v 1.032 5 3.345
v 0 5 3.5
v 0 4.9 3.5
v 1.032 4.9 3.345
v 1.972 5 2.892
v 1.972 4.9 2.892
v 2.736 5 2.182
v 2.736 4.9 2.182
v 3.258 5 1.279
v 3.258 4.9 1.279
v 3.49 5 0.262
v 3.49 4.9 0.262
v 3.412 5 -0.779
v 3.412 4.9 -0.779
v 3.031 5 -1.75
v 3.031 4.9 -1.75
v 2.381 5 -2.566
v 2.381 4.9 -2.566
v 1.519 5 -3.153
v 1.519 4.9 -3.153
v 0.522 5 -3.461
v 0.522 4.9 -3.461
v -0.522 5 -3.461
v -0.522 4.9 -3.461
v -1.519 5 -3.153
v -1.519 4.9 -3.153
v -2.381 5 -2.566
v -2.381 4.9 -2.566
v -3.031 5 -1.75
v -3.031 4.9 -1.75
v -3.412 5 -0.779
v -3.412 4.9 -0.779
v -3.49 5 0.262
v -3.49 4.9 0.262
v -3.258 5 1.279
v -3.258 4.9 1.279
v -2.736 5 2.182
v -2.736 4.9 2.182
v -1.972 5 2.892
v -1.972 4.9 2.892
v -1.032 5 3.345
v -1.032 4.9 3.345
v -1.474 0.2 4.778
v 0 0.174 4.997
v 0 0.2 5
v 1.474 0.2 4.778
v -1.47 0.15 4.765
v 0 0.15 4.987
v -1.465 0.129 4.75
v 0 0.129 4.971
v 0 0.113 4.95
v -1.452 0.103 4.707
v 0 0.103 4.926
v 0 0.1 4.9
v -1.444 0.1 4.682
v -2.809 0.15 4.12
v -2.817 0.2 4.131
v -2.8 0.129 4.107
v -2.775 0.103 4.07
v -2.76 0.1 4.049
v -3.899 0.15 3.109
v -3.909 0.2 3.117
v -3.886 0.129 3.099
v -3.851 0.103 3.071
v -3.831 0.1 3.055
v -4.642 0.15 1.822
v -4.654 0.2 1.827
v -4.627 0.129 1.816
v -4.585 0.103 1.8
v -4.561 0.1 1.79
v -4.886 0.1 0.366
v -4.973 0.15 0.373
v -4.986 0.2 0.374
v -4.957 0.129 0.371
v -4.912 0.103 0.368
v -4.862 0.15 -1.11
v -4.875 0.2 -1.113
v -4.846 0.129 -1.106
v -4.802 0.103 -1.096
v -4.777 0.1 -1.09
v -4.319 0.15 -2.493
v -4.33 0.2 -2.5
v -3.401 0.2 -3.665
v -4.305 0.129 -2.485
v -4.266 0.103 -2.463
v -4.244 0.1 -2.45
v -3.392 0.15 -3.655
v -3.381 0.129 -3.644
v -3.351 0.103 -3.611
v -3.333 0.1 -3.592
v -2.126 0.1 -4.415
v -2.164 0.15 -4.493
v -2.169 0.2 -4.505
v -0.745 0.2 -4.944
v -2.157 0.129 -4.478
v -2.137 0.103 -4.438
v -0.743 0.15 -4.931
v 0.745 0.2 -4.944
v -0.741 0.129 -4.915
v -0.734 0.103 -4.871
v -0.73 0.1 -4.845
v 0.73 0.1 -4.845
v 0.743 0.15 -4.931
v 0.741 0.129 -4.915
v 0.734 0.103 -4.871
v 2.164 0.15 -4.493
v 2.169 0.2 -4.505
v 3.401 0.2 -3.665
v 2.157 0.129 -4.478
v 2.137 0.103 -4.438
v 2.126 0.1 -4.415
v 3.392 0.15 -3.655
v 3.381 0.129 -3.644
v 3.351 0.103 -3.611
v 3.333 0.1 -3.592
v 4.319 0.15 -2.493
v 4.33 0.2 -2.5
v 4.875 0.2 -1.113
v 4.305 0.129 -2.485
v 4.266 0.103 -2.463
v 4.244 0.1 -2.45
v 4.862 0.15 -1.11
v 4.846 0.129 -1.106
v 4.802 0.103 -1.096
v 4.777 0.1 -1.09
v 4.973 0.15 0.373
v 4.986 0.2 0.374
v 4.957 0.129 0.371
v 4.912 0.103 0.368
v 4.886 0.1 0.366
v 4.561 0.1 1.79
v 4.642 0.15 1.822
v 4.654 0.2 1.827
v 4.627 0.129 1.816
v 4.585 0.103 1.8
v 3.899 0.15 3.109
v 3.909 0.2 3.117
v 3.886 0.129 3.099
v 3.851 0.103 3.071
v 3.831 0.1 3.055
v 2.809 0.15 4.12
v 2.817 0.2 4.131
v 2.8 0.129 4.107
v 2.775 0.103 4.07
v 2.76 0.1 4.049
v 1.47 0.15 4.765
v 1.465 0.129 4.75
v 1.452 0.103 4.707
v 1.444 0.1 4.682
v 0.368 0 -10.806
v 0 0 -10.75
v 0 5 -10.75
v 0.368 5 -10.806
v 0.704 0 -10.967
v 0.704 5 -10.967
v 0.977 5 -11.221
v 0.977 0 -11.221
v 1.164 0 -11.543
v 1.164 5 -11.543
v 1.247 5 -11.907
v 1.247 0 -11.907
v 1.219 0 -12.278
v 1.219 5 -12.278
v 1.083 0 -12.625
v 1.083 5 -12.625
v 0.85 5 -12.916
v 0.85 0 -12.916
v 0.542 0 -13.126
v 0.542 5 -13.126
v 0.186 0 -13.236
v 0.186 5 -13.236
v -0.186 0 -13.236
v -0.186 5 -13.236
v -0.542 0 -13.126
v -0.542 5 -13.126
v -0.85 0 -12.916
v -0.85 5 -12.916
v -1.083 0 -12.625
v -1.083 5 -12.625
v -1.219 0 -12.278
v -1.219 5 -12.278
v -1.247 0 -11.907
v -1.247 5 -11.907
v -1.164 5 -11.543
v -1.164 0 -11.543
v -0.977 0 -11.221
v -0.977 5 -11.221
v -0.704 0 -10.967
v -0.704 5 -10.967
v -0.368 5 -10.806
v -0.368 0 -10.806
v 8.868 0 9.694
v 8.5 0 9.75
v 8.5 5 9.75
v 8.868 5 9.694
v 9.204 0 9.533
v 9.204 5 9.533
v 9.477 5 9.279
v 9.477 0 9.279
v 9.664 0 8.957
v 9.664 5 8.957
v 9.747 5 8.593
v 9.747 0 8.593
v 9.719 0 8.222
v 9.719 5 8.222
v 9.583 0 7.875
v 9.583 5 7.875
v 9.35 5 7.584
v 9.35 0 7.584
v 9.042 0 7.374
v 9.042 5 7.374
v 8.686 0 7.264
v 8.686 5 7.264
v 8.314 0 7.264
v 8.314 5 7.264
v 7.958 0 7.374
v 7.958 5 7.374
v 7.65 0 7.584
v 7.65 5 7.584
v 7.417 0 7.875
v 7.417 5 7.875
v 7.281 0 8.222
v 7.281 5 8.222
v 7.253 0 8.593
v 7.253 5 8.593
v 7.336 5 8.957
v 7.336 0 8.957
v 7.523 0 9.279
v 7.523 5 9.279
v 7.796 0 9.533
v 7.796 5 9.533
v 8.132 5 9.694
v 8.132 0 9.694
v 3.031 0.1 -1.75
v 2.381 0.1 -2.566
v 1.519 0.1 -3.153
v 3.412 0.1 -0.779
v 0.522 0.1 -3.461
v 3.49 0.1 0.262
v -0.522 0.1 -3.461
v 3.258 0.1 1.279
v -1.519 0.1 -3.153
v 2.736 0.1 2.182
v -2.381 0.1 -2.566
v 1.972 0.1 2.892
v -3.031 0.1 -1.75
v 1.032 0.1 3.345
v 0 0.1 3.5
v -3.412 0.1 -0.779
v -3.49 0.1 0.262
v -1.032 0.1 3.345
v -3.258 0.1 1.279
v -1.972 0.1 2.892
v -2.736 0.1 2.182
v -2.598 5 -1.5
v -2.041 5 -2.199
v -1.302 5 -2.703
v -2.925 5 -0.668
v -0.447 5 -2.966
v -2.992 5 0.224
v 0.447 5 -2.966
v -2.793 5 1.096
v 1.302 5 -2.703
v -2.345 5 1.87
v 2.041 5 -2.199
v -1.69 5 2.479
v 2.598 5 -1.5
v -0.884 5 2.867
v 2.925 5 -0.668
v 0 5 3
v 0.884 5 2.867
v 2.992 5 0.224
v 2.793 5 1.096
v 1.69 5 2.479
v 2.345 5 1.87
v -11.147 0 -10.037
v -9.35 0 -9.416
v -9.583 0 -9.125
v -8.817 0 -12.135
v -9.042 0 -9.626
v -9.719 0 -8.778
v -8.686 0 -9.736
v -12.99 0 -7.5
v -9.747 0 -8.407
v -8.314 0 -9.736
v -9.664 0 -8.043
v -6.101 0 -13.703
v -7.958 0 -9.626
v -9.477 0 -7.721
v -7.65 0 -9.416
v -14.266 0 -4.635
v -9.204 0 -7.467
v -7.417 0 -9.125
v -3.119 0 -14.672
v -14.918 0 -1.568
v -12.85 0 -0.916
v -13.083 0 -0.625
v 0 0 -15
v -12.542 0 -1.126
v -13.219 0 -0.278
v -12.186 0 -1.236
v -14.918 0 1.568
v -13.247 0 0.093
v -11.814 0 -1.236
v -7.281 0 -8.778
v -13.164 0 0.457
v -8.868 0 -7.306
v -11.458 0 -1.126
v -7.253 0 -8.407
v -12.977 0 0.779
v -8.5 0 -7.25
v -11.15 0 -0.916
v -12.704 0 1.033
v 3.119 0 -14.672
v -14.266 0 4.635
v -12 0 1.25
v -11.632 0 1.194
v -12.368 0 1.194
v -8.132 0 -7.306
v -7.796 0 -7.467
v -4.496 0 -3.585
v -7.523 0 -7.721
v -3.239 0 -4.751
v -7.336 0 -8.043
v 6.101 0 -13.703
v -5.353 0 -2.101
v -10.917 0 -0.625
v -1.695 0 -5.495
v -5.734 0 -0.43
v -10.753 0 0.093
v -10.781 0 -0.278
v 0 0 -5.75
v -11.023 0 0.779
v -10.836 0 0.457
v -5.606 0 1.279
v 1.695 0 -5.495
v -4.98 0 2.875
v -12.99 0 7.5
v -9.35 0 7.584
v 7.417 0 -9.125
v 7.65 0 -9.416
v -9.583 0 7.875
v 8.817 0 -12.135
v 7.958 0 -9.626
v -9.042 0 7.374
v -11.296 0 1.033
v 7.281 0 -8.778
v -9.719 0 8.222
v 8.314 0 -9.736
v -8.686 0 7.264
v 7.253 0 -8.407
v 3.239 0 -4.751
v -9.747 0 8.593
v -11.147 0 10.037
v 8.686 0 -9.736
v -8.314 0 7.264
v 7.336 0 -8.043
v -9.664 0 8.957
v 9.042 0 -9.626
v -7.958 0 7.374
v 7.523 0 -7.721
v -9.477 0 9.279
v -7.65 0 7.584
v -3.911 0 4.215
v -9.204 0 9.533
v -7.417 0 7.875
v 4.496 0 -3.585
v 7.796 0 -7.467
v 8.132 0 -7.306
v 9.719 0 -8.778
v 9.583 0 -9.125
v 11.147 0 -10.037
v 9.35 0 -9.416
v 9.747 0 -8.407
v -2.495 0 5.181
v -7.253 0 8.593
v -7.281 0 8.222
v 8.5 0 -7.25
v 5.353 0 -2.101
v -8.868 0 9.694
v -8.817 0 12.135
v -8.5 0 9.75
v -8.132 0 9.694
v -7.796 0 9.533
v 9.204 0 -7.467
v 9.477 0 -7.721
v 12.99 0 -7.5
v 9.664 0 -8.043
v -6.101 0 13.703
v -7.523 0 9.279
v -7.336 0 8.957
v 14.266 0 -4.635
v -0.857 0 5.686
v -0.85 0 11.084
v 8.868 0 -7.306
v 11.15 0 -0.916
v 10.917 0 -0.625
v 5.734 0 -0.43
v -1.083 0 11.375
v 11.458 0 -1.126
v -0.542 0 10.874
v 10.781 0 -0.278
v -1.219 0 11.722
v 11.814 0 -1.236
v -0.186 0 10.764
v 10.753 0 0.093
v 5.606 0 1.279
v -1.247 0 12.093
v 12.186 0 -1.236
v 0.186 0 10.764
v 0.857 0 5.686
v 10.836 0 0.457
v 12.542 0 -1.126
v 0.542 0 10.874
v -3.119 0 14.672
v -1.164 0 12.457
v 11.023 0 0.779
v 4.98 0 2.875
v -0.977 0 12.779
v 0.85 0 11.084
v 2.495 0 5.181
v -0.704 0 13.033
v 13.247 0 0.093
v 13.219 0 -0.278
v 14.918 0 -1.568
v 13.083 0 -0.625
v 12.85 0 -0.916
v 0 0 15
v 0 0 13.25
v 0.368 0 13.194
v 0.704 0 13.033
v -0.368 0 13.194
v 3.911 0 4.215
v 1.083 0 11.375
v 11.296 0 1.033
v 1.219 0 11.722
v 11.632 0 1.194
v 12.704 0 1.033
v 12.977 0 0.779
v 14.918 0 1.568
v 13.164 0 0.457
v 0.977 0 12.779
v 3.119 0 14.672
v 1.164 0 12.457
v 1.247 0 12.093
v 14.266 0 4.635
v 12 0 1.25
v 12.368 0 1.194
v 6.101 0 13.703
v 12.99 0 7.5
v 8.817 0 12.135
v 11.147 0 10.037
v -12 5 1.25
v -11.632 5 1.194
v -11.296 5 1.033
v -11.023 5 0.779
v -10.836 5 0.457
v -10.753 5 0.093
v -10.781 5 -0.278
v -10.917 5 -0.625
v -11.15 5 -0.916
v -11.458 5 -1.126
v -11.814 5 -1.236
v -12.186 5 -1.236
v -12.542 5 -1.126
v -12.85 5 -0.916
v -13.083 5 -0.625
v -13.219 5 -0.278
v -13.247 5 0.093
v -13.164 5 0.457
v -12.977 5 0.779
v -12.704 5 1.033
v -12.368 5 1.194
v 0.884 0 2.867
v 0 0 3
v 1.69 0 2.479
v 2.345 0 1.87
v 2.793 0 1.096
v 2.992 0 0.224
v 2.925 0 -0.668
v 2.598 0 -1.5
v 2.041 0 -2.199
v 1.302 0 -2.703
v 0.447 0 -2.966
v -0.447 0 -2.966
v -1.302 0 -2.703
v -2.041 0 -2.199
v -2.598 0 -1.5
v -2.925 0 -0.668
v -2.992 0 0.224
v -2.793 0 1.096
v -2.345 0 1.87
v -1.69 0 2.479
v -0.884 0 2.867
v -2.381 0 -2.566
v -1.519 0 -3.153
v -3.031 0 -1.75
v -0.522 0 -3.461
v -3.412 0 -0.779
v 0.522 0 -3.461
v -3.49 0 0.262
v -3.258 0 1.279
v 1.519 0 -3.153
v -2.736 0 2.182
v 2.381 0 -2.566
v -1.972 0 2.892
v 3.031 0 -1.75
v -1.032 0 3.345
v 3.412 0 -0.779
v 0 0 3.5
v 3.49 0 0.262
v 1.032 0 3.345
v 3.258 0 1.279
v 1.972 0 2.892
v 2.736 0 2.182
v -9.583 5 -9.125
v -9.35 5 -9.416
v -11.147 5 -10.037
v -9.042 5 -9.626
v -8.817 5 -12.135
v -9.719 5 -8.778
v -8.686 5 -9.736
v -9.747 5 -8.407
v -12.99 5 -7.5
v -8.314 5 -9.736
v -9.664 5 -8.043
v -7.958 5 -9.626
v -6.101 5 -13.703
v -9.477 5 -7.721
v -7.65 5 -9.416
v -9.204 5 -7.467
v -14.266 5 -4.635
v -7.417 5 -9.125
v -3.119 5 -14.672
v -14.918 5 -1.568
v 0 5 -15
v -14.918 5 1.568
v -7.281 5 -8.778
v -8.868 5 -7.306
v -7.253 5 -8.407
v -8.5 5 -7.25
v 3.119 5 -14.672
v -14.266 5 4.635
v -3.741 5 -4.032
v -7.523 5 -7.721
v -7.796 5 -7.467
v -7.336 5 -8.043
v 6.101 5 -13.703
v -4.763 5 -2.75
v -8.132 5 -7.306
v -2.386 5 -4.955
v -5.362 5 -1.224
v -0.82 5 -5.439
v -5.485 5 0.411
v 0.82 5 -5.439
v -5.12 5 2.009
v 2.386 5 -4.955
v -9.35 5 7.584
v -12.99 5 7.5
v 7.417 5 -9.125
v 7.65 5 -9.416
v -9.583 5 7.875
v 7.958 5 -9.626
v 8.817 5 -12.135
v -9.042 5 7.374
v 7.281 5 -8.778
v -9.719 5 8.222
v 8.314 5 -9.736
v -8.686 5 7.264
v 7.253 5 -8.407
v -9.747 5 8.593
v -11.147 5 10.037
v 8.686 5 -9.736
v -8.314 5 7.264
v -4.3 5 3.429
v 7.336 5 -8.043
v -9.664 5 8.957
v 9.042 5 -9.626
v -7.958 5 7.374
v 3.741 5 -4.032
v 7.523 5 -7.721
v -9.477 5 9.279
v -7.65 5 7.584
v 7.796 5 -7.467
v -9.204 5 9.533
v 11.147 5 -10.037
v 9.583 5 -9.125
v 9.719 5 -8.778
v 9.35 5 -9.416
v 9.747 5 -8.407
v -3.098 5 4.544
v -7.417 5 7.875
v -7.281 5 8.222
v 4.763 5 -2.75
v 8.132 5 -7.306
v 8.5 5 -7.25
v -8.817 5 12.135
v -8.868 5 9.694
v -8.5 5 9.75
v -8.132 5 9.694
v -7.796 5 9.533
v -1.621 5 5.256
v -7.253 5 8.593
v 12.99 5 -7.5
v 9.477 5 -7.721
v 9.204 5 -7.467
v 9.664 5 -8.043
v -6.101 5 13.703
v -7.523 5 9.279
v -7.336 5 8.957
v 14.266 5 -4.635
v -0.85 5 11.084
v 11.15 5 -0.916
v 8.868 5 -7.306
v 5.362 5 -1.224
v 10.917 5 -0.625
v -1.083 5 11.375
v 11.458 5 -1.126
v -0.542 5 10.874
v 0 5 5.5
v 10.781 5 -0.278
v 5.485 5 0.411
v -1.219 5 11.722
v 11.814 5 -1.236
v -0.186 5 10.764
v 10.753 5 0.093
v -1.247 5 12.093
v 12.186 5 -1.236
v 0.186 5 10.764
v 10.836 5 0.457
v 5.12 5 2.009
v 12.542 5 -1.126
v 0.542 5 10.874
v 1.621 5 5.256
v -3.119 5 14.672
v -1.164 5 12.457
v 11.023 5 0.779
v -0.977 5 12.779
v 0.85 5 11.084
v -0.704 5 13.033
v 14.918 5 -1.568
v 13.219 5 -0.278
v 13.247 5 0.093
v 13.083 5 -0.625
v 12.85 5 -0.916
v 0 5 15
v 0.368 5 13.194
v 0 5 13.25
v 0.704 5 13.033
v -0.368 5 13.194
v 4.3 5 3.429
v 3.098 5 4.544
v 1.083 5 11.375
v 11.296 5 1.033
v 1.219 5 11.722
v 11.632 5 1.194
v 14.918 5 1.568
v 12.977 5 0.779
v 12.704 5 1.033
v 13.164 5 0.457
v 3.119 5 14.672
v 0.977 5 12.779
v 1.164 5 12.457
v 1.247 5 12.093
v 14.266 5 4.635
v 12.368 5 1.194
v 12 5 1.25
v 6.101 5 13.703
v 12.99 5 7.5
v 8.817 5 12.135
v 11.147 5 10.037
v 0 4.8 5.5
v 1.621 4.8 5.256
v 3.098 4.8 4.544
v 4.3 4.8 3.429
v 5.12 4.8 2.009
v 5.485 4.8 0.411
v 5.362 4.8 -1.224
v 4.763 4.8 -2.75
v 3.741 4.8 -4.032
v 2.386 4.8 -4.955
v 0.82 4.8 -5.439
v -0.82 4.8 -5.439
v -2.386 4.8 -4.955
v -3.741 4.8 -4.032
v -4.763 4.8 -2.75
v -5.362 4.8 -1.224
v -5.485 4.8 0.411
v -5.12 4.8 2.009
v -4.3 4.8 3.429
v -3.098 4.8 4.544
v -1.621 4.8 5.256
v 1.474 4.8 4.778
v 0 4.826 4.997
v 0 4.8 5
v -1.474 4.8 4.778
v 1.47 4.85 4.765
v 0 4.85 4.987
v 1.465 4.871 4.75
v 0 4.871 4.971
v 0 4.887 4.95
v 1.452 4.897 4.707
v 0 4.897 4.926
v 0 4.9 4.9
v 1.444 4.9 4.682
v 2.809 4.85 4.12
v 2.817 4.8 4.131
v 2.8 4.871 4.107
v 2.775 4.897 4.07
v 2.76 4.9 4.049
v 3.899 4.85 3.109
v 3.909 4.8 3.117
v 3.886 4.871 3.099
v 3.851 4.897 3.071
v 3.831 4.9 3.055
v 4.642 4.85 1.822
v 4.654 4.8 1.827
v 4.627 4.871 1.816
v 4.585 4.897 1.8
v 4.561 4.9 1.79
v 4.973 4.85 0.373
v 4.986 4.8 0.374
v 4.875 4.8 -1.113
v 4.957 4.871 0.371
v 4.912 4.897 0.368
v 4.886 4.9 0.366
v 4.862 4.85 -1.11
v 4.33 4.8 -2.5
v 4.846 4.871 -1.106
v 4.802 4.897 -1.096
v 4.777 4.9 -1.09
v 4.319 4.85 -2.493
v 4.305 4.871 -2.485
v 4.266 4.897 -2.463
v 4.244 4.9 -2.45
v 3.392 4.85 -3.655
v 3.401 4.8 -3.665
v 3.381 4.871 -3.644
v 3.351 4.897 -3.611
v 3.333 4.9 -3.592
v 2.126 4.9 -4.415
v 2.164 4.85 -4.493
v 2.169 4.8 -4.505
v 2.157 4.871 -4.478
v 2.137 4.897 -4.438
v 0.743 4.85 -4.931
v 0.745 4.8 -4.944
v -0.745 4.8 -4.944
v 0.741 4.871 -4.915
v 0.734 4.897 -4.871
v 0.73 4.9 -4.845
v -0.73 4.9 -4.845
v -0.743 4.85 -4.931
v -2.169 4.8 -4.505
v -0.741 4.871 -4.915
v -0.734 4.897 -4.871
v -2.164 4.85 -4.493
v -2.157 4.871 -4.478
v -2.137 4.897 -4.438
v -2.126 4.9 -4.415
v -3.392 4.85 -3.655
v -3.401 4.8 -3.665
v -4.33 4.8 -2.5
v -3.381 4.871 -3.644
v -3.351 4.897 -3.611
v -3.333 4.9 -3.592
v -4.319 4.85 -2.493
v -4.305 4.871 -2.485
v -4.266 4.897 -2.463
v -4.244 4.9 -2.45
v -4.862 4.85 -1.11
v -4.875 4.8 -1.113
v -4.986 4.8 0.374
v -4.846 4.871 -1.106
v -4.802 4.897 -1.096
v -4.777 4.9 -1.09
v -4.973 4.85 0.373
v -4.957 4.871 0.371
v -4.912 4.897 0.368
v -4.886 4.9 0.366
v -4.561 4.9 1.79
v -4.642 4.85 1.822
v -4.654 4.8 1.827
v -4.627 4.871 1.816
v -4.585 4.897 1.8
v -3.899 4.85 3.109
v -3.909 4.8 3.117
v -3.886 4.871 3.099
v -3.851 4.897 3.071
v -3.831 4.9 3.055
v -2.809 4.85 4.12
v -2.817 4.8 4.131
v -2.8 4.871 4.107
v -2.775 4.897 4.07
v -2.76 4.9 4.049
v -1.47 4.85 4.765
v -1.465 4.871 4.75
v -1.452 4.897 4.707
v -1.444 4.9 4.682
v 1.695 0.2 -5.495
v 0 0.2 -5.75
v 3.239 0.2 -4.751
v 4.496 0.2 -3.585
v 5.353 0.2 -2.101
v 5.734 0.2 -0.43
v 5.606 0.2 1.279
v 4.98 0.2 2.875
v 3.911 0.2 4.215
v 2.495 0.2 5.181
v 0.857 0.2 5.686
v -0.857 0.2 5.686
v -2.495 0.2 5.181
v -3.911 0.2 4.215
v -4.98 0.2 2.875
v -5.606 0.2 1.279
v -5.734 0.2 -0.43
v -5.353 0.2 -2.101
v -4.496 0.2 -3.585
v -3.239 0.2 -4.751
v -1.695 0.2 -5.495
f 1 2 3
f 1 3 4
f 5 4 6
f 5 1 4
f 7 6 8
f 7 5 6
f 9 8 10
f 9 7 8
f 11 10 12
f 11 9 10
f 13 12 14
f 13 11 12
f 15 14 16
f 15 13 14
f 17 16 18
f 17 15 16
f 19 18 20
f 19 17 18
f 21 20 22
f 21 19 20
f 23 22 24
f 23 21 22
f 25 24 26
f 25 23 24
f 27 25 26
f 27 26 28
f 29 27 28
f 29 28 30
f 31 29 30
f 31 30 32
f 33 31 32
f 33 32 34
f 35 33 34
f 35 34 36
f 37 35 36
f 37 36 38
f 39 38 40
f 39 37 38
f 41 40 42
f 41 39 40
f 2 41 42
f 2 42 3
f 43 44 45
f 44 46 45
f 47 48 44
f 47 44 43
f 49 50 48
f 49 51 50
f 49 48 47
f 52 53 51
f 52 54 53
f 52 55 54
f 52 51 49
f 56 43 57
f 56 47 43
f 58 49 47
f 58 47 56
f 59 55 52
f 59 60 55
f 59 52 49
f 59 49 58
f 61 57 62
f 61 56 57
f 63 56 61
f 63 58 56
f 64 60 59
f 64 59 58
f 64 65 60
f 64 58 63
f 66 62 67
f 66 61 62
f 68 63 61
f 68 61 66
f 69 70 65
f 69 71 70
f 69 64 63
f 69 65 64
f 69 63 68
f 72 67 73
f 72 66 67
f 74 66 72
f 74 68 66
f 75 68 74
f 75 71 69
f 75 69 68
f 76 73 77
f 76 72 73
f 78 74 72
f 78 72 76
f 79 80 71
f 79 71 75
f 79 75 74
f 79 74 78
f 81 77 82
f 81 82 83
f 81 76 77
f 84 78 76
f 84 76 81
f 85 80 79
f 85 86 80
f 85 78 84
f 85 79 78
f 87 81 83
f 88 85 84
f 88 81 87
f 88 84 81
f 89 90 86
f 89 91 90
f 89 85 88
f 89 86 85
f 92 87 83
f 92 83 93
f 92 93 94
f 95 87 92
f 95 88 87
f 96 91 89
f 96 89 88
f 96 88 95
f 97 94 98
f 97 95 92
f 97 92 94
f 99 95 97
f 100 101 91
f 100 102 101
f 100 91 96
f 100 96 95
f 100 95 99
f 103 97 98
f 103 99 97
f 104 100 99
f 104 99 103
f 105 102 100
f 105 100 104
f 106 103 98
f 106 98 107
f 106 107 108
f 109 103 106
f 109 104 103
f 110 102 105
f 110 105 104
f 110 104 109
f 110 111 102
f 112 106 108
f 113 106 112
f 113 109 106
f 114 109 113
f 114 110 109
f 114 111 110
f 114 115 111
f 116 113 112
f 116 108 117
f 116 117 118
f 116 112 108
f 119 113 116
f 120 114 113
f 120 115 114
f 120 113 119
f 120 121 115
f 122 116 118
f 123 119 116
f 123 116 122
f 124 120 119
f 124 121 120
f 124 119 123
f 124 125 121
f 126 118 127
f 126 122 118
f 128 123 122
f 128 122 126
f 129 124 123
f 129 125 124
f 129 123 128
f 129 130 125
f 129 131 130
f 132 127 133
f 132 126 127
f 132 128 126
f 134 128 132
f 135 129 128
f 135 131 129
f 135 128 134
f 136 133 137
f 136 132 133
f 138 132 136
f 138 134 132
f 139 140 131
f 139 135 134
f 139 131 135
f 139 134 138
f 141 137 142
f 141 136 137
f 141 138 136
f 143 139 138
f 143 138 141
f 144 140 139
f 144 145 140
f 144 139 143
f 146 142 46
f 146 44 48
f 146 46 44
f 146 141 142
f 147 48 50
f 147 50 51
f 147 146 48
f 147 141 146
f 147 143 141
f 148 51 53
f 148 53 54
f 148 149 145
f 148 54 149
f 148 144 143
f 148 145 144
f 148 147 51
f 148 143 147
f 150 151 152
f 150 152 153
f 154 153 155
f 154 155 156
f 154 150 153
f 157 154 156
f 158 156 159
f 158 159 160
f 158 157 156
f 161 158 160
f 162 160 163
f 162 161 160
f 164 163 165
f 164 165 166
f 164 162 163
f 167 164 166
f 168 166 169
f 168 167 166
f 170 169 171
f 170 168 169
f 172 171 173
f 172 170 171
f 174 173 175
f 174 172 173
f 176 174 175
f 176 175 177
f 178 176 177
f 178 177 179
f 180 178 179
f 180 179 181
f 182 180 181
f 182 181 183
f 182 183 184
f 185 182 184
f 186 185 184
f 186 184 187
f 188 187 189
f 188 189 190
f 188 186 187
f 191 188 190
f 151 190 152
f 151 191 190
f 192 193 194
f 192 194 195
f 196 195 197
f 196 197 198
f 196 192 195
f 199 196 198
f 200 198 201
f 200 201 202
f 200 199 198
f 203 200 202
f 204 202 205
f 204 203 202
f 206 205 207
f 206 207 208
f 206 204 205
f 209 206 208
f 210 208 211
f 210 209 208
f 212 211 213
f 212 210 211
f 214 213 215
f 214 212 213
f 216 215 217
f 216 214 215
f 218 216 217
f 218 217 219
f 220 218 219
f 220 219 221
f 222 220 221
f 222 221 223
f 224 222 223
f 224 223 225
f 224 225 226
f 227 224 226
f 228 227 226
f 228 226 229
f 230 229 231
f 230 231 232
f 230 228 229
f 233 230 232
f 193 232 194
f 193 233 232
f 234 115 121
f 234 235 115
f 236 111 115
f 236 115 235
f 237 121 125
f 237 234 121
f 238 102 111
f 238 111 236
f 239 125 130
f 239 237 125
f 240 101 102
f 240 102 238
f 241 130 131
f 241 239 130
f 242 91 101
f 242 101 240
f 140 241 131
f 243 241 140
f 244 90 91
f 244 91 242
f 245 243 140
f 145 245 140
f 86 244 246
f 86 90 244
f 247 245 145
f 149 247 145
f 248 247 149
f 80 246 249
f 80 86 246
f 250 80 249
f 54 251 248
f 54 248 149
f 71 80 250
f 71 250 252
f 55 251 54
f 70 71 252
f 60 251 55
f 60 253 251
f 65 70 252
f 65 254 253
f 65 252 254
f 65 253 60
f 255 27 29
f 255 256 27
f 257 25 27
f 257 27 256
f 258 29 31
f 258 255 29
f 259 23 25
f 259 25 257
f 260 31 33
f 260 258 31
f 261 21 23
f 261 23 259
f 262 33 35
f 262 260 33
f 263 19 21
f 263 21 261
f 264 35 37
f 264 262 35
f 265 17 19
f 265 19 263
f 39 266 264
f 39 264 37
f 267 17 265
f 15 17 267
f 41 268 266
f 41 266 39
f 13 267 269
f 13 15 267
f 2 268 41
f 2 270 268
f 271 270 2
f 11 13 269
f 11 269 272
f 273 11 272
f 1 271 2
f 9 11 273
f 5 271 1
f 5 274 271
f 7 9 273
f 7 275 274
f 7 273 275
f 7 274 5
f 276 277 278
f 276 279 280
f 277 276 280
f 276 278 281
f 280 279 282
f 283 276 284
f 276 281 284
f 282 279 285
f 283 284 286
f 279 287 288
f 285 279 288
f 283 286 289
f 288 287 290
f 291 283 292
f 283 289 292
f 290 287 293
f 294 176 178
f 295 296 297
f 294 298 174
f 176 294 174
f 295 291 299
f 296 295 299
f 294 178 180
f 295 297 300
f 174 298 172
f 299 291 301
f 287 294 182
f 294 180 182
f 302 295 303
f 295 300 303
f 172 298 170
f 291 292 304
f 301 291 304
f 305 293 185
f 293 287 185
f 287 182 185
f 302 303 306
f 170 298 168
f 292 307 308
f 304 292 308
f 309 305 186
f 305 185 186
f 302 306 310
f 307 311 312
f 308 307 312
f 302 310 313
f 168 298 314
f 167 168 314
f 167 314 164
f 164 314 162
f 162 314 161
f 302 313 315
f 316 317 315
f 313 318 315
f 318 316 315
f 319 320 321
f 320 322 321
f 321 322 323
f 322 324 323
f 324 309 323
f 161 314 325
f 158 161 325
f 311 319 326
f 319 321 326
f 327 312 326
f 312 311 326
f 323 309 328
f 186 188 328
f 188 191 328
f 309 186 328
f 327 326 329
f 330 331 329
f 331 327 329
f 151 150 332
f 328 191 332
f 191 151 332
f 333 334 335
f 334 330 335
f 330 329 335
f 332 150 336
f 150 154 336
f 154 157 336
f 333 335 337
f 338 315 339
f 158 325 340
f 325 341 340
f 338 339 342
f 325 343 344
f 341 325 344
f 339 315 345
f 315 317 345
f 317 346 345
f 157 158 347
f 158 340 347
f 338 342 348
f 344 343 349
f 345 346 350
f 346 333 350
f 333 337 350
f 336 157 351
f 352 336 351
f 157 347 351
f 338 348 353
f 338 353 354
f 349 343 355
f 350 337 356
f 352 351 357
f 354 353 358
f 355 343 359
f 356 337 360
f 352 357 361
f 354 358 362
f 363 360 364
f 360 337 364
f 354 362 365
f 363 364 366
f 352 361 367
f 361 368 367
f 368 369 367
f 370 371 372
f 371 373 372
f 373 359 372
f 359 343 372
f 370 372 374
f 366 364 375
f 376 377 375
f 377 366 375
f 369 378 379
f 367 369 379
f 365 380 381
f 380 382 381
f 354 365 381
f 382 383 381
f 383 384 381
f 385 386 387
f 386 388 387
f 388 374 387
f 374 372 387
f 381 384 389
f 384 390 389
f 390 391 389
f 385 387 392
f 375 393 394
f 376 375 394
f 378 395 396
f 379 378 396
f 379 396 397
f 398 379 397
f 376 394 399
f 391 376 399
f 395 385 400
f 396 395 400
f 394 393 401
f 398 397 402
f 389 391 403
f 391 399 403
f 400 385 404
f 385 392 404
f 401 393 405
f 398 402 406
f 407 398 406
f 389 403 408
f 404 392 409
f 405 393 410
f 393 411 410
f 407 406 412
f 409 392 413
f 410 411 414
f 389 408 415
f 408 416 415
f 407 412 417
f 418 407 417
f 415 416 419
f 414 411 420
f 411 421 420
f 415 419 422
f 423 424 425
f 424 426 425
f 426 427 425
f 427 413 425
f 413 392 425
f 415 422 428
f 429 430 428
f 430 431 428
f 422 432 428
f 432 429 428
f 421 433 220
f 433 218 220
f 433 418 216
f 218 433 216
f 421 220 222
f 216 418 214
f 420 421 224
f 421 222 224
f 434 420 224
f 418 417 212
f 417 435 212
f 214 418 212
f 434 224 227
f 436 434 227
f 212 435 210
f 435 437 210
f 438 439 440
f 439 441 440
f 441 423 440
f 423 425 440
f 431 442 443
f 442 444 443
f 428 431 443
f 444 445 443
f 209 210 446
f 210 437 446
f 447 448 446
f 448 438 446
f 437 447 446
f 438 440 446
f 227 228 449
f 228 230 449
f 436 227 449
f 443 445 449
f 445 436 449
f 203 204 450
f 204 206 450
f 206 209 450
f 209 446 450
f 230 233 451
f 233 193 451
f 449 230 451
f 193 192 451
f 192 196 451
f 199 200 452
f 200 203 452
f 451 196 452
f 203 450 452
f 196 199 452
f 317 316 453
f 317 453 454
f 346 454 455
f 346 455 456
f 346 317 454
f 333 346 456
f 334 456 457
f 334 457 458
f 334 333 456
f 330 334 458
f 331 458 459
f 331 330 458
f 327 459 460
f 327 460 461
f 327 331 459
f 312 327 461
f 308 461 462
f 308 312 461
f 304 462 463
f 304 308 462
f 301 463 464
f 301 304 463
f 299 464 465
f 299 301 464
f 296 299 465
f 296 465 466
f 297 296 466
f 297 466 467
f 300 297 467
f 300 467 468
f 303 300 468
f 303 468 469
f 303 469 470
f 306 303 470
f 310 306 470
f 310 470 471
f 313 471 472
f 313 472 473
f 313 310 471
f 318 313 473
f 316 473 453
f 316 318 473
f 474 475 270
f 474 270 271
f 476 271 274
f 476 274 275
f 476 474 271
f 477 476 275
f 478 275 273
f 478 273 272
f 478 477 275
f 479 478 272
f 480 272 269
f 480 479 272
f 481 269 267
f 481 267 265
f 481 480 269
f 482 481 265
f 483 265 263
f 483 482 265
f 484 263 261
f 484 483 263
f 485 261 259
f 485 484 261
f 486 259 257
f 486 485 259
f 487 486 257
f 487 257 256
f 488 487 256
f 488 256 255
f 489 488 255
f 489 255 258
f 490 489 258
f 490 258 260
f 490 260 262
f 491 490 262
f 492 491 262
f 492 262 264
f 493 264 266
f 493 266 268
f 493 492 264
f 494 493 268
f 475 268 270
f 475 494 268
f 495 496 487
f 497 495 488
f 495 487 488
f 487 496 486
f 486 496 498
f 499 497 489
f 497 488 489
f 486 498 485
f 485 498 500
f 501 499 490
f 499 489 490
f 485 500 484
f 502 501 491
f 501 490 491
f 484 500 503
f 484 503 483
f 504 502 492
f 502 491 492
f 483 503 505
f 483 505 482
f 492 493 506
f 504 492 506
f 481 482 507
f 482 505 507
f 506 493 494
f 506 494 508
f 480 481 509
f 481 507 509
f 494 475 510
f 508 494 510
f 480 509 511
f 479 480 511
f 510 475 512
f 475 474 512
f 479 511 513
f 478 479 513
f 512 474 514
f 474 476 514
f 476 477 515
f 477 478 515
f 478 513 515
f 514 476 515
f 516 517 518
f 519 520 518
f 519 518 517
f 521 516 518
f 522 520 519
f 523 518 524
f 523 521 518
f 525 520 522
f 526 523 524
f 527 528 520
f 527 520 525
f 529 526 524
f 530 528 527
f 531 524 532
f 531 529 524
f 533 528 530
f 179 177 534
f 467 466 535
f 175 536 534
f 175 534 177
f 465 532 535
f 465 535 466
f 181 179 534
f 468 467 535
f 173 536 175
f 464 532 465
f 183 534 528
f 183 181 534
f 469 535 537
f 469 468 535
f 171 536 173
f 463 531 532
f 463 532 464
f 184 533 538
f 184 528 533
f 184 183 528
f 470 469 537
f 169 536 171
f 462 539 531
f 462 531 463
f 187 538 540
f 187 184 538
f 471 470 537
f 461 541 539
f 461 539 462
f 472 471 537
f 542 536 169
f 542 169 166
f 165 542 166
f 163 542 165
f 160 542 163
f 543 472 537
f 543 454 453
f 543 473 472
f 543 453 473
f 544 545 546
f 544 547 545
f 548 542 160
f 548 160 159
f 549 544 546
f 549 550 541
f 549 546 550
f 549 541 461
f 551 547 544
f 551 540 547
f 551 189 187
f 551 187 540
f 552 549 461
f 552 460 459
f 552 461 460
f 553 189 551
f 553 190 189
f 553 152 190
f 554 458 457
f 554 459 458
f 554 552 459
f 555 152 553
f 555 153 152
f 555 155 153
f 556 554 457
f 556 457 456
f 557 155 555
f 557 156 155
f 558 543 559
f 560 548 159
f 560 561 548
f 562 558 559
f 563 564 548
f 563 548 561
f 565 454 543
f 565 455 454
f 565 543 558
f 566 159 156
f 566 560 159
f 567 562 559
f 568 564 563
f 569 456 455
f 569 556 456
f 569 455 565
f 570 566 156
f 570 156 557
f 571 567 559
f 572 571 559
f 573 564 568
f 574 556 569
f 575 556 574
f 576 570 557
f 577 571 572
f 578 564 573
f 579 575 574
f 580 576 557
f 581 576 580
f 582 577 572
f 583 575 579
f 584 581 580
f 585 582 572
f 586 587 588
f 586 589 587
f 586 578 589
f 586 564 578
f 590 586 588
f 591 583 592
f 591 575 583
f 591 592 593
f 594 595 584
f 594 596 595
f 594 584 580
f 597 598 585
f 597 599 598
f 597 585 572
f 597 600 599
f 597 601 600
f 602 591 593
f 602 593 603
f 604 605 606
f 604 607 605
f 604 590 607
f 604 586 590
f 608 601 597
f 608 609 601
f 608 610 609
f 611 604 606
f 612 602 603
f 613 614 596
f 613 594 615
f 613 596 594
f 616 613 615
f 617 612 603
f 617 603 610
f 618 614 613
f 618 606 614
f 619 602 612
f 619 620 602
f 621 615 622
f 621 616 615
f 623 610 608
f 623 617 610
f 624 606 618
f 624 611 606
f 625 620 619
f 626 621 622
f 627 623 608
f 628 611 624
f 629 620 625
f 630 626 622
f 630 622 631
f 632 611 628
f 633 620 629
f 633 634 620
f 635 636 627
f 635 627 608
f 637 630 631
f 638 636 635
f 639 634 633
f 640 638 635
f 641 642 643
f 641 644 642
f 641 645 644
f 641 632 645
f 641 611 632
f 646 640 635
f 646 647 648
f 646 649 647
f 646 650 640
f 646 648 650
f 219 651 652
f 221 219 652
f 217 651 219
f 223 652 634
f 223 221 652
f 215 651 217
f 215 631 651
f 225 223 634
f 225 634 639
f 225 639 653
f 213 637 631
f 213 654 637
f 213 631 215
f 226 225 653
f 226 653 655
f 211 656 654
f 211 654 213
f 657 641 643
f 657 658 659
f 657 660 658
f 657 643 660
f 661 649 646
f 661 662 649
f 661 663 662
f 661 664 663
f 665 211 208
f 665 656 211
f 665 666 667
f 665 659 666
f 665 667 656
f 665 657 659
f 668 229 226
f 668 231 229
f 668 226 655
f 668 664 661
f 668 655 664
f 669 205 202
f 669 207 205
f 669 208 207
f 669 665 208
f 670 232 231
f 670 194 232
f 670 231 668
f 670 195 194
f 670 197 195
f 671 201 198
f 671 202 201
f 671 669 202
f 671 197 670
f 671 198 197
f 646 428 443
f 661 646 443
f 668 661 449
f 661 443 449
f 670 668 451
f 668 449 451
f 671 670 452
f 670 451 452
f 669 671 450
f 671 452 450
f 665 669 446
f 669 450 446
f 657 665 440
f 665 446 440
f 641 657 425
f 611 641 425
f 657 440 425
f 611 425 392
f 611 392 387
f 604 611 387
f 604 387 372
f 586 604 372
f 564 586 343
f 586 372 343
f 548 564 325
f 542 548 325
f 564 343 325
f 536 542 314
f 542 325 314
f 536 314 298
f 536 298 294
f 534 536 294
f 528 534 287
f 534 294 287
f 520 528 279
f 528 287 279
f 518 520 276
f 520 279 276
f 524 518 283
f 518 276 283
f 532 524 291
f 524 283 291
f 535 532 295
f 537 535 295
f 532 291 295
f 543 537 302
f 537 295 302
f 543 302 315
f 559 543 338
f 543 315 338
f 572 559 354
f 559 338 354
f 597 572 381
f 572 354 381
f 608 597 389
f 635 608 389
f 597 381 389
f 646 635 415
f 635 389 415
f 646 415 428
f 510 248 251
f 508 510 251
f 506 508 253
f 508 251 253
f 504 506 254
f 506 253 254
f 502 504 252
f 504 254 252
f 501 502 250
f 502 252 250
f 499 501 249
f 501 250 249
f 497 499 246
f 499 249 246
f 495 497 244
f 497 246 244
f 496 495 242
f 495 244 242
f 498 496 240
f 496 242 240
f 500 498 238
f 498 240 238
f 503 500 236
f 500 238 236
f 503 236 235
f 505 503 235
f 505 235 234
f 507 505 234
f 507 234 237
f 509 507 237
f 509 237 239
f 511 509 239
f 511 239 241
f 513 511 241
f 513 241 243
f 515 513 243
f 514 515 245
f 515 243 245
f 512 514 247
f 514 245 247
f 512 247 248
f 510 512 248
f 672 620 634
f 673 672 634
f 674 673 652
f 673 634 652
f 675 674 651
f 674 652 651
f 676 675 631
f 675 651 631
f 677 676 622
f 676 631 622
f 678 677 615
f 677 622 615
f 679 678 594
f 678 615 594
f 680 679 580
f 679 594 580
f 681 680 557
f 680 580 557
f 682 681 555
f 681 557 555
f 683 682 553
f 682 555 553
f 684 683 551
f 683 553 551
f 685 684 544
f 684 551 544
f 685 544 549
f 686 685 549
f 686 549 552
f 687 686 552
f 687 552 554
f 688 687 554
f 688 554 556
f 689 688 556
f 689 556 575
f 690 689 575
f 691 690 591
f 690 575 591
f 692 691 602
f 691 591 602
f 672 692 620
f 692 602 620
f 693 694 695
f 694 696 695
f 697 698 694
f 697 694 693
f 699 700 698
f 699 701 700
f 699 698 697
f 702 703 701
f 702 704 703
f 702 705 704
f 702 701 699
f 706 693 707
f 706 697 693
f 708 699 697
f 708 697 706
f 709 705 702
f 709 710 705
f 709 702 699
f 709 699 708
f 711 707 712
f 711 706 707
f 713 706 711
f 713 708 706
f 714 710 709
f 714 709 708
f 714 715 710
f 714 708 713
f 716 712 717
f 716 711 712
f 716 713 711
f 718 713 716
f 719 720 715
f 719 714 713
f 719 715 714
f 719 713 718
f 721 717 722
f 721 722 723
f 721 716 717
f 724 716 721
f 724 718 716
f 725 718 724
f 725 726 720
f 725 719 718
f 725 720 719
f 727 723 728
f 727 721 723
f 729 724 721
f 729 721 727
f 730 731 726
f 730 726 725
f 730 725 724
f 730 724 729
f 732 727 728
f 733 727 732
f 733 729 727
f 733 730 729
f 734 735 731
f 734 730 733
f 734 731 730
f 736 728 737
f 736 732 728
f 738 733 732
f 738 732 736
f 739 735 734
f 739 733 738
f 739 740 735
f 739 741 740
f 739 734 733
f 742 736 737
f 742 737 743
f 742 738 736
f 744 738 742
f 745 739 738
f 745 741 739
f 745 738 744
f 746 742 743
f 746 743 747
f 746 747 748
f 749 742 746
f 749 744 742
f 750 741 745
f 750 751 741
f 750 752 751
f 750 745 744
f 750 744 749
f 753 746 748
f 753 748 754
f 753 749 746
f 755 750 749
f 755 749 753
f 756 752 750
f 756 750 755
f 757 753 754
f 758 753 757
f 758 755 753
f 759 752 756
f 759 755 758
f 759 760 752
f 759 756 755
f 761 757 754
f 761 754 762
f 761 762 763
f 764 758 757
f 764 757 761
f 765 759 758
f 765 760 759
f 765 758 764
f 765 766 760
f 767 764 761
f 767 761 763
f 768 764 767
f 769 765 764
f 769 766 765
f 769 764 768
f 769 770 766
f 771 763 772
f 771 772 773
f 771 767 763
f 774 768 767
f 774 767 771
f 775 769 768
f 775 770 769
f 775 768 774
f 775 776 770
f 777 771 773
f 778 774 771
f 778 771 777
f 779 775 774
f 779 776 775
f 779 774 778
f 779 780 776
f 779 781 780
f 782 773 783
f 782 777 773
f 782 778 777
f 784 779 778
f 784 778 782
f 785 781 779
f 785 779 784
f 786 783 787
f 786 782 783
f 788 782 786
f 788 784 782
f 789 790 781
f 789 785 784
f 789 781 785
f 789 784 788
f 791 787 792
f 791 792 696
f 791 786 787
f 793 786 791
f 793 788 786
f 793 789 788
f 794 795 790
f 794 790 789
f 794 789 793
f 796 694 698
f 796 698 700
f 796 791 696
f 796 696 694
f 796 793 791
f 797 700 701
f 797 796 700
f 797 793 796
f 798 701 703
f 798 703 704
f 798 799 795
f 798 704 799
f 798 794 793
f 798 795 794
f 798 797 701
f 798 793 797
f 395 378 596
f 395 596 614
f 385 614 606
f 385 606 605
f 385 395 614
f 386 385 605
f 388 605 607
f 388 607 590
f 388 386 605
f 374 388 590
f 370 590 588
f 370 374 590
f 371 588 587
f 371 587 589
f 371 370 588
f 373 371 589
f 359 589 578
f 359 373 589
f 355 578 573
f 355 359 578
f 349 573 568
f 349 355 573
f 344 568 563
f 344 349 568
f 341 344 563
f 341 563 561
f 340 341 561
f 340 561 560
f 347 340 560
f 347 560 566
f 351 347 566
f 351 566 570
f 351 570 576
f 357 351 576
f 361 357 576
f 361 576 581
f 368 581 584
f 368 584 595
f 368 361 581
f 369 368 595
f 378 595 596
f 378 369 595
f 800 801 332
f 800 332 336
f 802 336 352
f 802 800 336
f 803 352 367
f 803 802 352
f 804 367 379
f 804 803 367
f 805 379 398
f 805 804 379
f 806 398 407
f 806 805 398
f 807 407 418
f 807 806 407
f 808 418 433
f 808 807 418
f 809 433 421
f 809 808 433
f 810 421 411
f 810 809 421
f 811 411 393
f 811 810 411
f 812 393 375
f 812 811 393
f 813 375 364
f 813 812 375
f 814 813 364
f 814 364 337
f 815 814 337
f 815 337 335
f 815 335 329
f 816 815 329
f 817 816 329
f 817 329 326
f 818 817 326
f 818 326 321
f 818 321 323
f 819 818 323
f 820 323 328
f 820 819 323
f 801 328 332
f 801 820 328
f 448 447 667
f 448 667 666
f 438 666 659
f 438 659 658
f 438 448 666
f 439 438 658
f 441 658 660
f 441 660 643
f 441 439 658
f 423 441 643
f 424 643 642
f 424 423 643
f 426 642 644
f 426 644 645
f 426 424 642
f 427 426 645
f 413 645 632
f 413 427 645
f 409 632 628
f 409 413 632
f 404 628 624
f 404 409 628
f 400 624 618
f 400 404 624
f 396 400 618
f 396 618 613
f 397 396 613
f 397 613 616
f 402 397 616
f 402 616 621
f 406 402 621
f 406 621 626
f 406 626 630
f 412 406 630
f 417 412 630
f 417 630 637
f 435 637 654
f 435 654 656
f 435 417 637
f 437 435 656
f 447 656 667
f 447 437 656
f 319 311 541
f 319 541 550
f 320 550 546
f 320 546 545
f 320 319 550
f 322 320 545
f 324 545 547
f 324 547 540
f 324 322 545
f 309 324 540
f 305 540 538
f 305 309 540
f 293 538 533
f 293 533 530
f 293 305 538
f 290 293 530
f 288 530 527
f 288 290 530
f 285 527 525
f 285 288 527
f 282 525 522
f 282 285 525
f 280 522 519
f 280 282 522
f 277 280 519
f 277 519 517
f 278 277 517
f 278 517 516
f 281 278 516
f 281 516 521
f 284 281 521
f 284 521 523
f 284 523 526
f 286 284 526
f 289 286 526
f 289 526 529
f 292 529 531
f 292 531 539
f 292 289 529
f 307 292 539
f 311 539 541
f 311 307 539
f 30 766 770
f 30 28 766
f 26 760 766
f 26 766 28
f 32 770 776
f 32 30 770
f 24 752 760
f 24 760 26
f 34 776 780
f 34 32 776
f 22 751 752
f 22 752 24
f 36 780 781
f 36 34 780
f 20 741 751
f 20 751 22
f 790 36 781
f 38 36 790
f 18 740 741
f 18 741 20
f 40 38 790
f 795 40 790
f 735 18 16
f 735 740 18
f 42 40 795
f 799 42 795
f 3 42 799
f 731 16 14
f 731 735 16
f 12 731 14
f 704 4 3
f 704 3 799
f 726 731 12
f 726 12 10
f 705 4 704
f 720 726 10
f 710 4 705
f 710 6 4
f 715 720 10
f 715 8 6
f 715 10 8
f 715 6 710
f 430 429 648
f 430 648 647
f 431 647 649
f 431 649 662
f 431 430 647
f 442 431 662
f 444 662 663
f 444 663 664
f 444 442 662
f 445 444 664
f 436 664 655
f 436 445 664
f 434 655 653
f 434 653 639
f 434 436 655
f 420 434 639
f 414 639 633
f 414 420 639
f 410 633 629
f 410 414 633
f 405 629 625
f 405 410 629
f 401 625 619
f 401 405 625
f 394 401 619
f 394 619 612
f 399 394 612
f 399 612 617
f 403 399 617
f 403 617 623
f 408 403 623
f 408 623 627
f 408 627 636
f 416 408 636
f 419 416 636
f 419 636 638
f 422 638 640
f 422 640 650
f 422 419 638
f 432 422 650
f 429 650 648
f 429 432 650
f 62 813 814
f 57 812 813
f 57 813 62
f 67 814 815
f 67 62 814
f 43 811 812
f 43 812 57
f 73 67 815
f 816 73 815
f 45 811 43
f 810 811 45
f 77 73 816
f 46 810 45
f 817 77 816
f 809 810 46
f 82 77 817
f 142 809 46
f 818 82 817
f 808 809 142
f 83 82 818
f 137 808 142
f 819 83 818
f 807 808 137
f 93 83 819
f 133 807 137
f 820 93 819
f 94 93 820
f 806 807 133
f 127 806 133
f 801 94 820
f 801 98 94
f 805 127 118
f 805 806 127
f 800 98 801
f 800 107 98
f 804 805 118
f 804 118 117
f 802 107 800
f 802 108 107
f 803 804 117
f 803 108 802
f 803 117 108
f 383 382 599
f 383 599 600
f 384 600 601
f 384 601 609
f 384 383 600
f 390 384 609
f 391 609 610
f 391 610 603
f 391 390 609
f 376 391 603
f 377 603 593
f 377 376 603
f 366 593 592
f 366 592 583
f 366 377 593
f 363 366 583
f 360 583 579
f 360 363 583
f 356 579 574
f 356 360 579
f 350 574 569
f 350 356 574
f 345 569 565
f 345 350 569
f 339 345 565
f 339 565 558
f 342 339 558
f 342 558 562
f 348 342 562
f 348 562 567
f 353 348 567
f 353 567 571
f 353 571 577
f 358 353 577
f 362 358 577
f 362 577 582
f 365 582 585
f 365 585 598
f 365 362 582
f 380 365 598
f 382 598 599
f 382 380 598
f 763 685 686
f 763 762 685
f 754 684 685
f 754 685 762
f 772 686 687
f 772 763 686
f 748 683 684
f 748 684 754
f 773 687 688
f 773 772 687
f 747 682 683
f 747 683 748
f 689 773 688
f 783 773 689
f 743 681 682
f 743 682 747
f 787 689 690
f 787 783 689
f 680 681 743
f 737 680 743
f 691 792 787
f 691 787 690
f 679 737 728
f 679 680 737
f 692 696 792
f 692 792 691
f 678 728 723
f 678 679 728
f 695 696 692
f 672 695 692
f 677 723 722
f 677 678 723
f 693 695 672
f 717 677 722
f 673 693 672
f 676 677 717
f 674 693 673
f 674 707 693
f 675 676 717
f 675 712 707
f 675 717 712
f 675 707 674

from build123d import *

# Parameters (mm, degrees)
SKETCH1_R           = 15
SKETCH1_R_2         = 1.25
SKETCH1_R_3         = 3
BOSS_EXTRUDE1_DEPTH = 5
SKETCH4_R           = 5.5
SKETCH4_R_2         = 5
CUT_EXTRUDE1_DEPTH  = 0.2
SKETCH4_3_R         = 5
SKETCH4_3_R_2       = 3.5
CUT_EXTRUDE2_DEPTH  = 0.1
CUT_EXTRUDE3_START  = -0.1
SKETCH5_R           = 5
SKETCH5_R_2         = 3.5
CUT_EXTRUDE3_DEPTH  = 0.1
CUT_EXTRUDE4_START  = -0.2
SKETCH5_3_R         = 5.75
SKETCH5_3_R_2       = 5
CUT_EXTRUDE4_DEPTH  = 0.2
FILLET1_R           = 0.1


with BuildPart() as part:
    # Sketch1 → Boss-Extrude1 (new body)
    with BuildSketch(Plane(origin=(0, 0, 0), x_dir=(1, 0, 0), z_dir=(0, 1, 0))):
        with Locations(Location((0, 0, 0), (0, 0, 270))):
            Circle(SKETCH1_R)
        with Locations(Location((0, 12, 0), (0, 0, 270))):
            Circle(SKETCH1_R_2, mode=Mode.SUBTRACT)
        with Locations(Location((0, -12, 0), (0, 0, 270))):
            Circle(SKETCH1_R_2, mode=Mode.SUBTRACT)
        with Locations(Location((0, 0, 0), (0, 0, 270))):
            Circle(SKETCH1_R_3, mode=Mode.SUBTRACT)
        with Locations(Location((-12, 0, 0), (0, 0, 270))):
            Circle(SKETCH1_R_2, mode=Mode.SUBTRACT)
        with Locations(Location((12, 0, 0), (0, 0, 270))):
            Circle(SKETCH1_R_2, mode=Mode.SUBTRACT)
        with Locations(Location((8.5, 8.5, 0), (0, 0, 270))):
            Circle(SKETCH1_R_2, mode=Mode.SUBTRACT)
        with Locations(Location((8.5, -8.5, 0), (0, 0, 270))):
            Circle(SKETCH1_R_2, mode=Mode.SUBTRACT)
        with Locations(Location((-8.5, -8.5, 0), (0, 0, 270))):
            Circle(SKETCH1_R_2, mode=Mode.SUBTRACT)
        with Locations(Location((-8.5, 8.5, 0), (0, 0, 270))):
            Circle(SKETCH1_R_2, mode=Mode.SUBTRACT)
    extrude(amount=BOSS_EXTRUDE1_DEPTH)

    # Sketch4 → Cut-Extrude1 (cut)
    with BuildSketch(Plane(origin=(0, 5, 0), x_dir=(1, 0, 0), z_dir=(0, 1, 0))):
        with Locations(Location((0, 0, 0), (0, 0, 270))):
            Circle(SKETCH4_R)
        with Locations(Location((0, 0, 0), (0, 0, 270))):
            Circle(SKETCH4_R_2, mode=Mode.SUBTRACT)
    extrude(amount=-CUT_EXTRUDE1_DEPTH, mode=Mode.SUBTRACT)

    # Sketch4<3> → Cut-Extrude2 (cut)
    with BuildSketch(Plane(origin=(0, 5, 0), x_dir=(1, 0, 0), z_dir=(0, 1, 0))):
        with Locations(Location((0, 0, 0), (0, 0, 270))):
            Circle(SKETCH4_3_R)
        with Locations(Location((0, 0, 0), (0, 0, 270))):
            Circle(SKETCH4_3_R_2, mode=Mode.SUBTRACT)
    extrude(amount=-CUT_EXTRUDE2_DEPTH, mode=Mode.SUBTRACT)

    # Sketch5 → Cut-Extrude3 (cut)
    with BuildSketch(Plane.XZ.offset(CUT_EXTRUDE3_START)):
        with Locations(Location((0, 0, 0), (0, 0, 90))):
            Circle(SKETCH5_R)
        with Locations(Location((0, 0, 0), (0, 0, 90))):
            Circle(SKETCH5_R_2, mode=Mode.SUBTRACT)
    extrude(amount=CUT_EXTRUDE3_DEPTH, mode=Mode.SUBTRACT)

    # Sketch5<3> → Cut-Extrude4 (cut)
    with BuildSketch(Plane.XZ.offset(CUT_EXTRUDE4_START)):
        with Locations(Location((0, 0, 0), (0, 0, 270))):
            Circle(SKETCH5_3_R)
        with Locations(Location((0, 0, 0), (0, 0, 90))):
            Circle(SKETCH5_3_R_2, mode=Mode.SUBTRACT)
    extrude(amount=CUT_EXTRUDE4_DEPTH, mode=Mode.SUBTRACT)

    # Fillet1
    fillet1_edges = [part.edges().sort_by_distance(p)[0] for p in [
        (0, 4.9, -5),
        (0, 0.1, -5),
    ]]
    fillet(fillet1_edges, radius=FILLET1_R - 0.0001)  # a hair under: the kernel refuses the full size


solid = part.part
